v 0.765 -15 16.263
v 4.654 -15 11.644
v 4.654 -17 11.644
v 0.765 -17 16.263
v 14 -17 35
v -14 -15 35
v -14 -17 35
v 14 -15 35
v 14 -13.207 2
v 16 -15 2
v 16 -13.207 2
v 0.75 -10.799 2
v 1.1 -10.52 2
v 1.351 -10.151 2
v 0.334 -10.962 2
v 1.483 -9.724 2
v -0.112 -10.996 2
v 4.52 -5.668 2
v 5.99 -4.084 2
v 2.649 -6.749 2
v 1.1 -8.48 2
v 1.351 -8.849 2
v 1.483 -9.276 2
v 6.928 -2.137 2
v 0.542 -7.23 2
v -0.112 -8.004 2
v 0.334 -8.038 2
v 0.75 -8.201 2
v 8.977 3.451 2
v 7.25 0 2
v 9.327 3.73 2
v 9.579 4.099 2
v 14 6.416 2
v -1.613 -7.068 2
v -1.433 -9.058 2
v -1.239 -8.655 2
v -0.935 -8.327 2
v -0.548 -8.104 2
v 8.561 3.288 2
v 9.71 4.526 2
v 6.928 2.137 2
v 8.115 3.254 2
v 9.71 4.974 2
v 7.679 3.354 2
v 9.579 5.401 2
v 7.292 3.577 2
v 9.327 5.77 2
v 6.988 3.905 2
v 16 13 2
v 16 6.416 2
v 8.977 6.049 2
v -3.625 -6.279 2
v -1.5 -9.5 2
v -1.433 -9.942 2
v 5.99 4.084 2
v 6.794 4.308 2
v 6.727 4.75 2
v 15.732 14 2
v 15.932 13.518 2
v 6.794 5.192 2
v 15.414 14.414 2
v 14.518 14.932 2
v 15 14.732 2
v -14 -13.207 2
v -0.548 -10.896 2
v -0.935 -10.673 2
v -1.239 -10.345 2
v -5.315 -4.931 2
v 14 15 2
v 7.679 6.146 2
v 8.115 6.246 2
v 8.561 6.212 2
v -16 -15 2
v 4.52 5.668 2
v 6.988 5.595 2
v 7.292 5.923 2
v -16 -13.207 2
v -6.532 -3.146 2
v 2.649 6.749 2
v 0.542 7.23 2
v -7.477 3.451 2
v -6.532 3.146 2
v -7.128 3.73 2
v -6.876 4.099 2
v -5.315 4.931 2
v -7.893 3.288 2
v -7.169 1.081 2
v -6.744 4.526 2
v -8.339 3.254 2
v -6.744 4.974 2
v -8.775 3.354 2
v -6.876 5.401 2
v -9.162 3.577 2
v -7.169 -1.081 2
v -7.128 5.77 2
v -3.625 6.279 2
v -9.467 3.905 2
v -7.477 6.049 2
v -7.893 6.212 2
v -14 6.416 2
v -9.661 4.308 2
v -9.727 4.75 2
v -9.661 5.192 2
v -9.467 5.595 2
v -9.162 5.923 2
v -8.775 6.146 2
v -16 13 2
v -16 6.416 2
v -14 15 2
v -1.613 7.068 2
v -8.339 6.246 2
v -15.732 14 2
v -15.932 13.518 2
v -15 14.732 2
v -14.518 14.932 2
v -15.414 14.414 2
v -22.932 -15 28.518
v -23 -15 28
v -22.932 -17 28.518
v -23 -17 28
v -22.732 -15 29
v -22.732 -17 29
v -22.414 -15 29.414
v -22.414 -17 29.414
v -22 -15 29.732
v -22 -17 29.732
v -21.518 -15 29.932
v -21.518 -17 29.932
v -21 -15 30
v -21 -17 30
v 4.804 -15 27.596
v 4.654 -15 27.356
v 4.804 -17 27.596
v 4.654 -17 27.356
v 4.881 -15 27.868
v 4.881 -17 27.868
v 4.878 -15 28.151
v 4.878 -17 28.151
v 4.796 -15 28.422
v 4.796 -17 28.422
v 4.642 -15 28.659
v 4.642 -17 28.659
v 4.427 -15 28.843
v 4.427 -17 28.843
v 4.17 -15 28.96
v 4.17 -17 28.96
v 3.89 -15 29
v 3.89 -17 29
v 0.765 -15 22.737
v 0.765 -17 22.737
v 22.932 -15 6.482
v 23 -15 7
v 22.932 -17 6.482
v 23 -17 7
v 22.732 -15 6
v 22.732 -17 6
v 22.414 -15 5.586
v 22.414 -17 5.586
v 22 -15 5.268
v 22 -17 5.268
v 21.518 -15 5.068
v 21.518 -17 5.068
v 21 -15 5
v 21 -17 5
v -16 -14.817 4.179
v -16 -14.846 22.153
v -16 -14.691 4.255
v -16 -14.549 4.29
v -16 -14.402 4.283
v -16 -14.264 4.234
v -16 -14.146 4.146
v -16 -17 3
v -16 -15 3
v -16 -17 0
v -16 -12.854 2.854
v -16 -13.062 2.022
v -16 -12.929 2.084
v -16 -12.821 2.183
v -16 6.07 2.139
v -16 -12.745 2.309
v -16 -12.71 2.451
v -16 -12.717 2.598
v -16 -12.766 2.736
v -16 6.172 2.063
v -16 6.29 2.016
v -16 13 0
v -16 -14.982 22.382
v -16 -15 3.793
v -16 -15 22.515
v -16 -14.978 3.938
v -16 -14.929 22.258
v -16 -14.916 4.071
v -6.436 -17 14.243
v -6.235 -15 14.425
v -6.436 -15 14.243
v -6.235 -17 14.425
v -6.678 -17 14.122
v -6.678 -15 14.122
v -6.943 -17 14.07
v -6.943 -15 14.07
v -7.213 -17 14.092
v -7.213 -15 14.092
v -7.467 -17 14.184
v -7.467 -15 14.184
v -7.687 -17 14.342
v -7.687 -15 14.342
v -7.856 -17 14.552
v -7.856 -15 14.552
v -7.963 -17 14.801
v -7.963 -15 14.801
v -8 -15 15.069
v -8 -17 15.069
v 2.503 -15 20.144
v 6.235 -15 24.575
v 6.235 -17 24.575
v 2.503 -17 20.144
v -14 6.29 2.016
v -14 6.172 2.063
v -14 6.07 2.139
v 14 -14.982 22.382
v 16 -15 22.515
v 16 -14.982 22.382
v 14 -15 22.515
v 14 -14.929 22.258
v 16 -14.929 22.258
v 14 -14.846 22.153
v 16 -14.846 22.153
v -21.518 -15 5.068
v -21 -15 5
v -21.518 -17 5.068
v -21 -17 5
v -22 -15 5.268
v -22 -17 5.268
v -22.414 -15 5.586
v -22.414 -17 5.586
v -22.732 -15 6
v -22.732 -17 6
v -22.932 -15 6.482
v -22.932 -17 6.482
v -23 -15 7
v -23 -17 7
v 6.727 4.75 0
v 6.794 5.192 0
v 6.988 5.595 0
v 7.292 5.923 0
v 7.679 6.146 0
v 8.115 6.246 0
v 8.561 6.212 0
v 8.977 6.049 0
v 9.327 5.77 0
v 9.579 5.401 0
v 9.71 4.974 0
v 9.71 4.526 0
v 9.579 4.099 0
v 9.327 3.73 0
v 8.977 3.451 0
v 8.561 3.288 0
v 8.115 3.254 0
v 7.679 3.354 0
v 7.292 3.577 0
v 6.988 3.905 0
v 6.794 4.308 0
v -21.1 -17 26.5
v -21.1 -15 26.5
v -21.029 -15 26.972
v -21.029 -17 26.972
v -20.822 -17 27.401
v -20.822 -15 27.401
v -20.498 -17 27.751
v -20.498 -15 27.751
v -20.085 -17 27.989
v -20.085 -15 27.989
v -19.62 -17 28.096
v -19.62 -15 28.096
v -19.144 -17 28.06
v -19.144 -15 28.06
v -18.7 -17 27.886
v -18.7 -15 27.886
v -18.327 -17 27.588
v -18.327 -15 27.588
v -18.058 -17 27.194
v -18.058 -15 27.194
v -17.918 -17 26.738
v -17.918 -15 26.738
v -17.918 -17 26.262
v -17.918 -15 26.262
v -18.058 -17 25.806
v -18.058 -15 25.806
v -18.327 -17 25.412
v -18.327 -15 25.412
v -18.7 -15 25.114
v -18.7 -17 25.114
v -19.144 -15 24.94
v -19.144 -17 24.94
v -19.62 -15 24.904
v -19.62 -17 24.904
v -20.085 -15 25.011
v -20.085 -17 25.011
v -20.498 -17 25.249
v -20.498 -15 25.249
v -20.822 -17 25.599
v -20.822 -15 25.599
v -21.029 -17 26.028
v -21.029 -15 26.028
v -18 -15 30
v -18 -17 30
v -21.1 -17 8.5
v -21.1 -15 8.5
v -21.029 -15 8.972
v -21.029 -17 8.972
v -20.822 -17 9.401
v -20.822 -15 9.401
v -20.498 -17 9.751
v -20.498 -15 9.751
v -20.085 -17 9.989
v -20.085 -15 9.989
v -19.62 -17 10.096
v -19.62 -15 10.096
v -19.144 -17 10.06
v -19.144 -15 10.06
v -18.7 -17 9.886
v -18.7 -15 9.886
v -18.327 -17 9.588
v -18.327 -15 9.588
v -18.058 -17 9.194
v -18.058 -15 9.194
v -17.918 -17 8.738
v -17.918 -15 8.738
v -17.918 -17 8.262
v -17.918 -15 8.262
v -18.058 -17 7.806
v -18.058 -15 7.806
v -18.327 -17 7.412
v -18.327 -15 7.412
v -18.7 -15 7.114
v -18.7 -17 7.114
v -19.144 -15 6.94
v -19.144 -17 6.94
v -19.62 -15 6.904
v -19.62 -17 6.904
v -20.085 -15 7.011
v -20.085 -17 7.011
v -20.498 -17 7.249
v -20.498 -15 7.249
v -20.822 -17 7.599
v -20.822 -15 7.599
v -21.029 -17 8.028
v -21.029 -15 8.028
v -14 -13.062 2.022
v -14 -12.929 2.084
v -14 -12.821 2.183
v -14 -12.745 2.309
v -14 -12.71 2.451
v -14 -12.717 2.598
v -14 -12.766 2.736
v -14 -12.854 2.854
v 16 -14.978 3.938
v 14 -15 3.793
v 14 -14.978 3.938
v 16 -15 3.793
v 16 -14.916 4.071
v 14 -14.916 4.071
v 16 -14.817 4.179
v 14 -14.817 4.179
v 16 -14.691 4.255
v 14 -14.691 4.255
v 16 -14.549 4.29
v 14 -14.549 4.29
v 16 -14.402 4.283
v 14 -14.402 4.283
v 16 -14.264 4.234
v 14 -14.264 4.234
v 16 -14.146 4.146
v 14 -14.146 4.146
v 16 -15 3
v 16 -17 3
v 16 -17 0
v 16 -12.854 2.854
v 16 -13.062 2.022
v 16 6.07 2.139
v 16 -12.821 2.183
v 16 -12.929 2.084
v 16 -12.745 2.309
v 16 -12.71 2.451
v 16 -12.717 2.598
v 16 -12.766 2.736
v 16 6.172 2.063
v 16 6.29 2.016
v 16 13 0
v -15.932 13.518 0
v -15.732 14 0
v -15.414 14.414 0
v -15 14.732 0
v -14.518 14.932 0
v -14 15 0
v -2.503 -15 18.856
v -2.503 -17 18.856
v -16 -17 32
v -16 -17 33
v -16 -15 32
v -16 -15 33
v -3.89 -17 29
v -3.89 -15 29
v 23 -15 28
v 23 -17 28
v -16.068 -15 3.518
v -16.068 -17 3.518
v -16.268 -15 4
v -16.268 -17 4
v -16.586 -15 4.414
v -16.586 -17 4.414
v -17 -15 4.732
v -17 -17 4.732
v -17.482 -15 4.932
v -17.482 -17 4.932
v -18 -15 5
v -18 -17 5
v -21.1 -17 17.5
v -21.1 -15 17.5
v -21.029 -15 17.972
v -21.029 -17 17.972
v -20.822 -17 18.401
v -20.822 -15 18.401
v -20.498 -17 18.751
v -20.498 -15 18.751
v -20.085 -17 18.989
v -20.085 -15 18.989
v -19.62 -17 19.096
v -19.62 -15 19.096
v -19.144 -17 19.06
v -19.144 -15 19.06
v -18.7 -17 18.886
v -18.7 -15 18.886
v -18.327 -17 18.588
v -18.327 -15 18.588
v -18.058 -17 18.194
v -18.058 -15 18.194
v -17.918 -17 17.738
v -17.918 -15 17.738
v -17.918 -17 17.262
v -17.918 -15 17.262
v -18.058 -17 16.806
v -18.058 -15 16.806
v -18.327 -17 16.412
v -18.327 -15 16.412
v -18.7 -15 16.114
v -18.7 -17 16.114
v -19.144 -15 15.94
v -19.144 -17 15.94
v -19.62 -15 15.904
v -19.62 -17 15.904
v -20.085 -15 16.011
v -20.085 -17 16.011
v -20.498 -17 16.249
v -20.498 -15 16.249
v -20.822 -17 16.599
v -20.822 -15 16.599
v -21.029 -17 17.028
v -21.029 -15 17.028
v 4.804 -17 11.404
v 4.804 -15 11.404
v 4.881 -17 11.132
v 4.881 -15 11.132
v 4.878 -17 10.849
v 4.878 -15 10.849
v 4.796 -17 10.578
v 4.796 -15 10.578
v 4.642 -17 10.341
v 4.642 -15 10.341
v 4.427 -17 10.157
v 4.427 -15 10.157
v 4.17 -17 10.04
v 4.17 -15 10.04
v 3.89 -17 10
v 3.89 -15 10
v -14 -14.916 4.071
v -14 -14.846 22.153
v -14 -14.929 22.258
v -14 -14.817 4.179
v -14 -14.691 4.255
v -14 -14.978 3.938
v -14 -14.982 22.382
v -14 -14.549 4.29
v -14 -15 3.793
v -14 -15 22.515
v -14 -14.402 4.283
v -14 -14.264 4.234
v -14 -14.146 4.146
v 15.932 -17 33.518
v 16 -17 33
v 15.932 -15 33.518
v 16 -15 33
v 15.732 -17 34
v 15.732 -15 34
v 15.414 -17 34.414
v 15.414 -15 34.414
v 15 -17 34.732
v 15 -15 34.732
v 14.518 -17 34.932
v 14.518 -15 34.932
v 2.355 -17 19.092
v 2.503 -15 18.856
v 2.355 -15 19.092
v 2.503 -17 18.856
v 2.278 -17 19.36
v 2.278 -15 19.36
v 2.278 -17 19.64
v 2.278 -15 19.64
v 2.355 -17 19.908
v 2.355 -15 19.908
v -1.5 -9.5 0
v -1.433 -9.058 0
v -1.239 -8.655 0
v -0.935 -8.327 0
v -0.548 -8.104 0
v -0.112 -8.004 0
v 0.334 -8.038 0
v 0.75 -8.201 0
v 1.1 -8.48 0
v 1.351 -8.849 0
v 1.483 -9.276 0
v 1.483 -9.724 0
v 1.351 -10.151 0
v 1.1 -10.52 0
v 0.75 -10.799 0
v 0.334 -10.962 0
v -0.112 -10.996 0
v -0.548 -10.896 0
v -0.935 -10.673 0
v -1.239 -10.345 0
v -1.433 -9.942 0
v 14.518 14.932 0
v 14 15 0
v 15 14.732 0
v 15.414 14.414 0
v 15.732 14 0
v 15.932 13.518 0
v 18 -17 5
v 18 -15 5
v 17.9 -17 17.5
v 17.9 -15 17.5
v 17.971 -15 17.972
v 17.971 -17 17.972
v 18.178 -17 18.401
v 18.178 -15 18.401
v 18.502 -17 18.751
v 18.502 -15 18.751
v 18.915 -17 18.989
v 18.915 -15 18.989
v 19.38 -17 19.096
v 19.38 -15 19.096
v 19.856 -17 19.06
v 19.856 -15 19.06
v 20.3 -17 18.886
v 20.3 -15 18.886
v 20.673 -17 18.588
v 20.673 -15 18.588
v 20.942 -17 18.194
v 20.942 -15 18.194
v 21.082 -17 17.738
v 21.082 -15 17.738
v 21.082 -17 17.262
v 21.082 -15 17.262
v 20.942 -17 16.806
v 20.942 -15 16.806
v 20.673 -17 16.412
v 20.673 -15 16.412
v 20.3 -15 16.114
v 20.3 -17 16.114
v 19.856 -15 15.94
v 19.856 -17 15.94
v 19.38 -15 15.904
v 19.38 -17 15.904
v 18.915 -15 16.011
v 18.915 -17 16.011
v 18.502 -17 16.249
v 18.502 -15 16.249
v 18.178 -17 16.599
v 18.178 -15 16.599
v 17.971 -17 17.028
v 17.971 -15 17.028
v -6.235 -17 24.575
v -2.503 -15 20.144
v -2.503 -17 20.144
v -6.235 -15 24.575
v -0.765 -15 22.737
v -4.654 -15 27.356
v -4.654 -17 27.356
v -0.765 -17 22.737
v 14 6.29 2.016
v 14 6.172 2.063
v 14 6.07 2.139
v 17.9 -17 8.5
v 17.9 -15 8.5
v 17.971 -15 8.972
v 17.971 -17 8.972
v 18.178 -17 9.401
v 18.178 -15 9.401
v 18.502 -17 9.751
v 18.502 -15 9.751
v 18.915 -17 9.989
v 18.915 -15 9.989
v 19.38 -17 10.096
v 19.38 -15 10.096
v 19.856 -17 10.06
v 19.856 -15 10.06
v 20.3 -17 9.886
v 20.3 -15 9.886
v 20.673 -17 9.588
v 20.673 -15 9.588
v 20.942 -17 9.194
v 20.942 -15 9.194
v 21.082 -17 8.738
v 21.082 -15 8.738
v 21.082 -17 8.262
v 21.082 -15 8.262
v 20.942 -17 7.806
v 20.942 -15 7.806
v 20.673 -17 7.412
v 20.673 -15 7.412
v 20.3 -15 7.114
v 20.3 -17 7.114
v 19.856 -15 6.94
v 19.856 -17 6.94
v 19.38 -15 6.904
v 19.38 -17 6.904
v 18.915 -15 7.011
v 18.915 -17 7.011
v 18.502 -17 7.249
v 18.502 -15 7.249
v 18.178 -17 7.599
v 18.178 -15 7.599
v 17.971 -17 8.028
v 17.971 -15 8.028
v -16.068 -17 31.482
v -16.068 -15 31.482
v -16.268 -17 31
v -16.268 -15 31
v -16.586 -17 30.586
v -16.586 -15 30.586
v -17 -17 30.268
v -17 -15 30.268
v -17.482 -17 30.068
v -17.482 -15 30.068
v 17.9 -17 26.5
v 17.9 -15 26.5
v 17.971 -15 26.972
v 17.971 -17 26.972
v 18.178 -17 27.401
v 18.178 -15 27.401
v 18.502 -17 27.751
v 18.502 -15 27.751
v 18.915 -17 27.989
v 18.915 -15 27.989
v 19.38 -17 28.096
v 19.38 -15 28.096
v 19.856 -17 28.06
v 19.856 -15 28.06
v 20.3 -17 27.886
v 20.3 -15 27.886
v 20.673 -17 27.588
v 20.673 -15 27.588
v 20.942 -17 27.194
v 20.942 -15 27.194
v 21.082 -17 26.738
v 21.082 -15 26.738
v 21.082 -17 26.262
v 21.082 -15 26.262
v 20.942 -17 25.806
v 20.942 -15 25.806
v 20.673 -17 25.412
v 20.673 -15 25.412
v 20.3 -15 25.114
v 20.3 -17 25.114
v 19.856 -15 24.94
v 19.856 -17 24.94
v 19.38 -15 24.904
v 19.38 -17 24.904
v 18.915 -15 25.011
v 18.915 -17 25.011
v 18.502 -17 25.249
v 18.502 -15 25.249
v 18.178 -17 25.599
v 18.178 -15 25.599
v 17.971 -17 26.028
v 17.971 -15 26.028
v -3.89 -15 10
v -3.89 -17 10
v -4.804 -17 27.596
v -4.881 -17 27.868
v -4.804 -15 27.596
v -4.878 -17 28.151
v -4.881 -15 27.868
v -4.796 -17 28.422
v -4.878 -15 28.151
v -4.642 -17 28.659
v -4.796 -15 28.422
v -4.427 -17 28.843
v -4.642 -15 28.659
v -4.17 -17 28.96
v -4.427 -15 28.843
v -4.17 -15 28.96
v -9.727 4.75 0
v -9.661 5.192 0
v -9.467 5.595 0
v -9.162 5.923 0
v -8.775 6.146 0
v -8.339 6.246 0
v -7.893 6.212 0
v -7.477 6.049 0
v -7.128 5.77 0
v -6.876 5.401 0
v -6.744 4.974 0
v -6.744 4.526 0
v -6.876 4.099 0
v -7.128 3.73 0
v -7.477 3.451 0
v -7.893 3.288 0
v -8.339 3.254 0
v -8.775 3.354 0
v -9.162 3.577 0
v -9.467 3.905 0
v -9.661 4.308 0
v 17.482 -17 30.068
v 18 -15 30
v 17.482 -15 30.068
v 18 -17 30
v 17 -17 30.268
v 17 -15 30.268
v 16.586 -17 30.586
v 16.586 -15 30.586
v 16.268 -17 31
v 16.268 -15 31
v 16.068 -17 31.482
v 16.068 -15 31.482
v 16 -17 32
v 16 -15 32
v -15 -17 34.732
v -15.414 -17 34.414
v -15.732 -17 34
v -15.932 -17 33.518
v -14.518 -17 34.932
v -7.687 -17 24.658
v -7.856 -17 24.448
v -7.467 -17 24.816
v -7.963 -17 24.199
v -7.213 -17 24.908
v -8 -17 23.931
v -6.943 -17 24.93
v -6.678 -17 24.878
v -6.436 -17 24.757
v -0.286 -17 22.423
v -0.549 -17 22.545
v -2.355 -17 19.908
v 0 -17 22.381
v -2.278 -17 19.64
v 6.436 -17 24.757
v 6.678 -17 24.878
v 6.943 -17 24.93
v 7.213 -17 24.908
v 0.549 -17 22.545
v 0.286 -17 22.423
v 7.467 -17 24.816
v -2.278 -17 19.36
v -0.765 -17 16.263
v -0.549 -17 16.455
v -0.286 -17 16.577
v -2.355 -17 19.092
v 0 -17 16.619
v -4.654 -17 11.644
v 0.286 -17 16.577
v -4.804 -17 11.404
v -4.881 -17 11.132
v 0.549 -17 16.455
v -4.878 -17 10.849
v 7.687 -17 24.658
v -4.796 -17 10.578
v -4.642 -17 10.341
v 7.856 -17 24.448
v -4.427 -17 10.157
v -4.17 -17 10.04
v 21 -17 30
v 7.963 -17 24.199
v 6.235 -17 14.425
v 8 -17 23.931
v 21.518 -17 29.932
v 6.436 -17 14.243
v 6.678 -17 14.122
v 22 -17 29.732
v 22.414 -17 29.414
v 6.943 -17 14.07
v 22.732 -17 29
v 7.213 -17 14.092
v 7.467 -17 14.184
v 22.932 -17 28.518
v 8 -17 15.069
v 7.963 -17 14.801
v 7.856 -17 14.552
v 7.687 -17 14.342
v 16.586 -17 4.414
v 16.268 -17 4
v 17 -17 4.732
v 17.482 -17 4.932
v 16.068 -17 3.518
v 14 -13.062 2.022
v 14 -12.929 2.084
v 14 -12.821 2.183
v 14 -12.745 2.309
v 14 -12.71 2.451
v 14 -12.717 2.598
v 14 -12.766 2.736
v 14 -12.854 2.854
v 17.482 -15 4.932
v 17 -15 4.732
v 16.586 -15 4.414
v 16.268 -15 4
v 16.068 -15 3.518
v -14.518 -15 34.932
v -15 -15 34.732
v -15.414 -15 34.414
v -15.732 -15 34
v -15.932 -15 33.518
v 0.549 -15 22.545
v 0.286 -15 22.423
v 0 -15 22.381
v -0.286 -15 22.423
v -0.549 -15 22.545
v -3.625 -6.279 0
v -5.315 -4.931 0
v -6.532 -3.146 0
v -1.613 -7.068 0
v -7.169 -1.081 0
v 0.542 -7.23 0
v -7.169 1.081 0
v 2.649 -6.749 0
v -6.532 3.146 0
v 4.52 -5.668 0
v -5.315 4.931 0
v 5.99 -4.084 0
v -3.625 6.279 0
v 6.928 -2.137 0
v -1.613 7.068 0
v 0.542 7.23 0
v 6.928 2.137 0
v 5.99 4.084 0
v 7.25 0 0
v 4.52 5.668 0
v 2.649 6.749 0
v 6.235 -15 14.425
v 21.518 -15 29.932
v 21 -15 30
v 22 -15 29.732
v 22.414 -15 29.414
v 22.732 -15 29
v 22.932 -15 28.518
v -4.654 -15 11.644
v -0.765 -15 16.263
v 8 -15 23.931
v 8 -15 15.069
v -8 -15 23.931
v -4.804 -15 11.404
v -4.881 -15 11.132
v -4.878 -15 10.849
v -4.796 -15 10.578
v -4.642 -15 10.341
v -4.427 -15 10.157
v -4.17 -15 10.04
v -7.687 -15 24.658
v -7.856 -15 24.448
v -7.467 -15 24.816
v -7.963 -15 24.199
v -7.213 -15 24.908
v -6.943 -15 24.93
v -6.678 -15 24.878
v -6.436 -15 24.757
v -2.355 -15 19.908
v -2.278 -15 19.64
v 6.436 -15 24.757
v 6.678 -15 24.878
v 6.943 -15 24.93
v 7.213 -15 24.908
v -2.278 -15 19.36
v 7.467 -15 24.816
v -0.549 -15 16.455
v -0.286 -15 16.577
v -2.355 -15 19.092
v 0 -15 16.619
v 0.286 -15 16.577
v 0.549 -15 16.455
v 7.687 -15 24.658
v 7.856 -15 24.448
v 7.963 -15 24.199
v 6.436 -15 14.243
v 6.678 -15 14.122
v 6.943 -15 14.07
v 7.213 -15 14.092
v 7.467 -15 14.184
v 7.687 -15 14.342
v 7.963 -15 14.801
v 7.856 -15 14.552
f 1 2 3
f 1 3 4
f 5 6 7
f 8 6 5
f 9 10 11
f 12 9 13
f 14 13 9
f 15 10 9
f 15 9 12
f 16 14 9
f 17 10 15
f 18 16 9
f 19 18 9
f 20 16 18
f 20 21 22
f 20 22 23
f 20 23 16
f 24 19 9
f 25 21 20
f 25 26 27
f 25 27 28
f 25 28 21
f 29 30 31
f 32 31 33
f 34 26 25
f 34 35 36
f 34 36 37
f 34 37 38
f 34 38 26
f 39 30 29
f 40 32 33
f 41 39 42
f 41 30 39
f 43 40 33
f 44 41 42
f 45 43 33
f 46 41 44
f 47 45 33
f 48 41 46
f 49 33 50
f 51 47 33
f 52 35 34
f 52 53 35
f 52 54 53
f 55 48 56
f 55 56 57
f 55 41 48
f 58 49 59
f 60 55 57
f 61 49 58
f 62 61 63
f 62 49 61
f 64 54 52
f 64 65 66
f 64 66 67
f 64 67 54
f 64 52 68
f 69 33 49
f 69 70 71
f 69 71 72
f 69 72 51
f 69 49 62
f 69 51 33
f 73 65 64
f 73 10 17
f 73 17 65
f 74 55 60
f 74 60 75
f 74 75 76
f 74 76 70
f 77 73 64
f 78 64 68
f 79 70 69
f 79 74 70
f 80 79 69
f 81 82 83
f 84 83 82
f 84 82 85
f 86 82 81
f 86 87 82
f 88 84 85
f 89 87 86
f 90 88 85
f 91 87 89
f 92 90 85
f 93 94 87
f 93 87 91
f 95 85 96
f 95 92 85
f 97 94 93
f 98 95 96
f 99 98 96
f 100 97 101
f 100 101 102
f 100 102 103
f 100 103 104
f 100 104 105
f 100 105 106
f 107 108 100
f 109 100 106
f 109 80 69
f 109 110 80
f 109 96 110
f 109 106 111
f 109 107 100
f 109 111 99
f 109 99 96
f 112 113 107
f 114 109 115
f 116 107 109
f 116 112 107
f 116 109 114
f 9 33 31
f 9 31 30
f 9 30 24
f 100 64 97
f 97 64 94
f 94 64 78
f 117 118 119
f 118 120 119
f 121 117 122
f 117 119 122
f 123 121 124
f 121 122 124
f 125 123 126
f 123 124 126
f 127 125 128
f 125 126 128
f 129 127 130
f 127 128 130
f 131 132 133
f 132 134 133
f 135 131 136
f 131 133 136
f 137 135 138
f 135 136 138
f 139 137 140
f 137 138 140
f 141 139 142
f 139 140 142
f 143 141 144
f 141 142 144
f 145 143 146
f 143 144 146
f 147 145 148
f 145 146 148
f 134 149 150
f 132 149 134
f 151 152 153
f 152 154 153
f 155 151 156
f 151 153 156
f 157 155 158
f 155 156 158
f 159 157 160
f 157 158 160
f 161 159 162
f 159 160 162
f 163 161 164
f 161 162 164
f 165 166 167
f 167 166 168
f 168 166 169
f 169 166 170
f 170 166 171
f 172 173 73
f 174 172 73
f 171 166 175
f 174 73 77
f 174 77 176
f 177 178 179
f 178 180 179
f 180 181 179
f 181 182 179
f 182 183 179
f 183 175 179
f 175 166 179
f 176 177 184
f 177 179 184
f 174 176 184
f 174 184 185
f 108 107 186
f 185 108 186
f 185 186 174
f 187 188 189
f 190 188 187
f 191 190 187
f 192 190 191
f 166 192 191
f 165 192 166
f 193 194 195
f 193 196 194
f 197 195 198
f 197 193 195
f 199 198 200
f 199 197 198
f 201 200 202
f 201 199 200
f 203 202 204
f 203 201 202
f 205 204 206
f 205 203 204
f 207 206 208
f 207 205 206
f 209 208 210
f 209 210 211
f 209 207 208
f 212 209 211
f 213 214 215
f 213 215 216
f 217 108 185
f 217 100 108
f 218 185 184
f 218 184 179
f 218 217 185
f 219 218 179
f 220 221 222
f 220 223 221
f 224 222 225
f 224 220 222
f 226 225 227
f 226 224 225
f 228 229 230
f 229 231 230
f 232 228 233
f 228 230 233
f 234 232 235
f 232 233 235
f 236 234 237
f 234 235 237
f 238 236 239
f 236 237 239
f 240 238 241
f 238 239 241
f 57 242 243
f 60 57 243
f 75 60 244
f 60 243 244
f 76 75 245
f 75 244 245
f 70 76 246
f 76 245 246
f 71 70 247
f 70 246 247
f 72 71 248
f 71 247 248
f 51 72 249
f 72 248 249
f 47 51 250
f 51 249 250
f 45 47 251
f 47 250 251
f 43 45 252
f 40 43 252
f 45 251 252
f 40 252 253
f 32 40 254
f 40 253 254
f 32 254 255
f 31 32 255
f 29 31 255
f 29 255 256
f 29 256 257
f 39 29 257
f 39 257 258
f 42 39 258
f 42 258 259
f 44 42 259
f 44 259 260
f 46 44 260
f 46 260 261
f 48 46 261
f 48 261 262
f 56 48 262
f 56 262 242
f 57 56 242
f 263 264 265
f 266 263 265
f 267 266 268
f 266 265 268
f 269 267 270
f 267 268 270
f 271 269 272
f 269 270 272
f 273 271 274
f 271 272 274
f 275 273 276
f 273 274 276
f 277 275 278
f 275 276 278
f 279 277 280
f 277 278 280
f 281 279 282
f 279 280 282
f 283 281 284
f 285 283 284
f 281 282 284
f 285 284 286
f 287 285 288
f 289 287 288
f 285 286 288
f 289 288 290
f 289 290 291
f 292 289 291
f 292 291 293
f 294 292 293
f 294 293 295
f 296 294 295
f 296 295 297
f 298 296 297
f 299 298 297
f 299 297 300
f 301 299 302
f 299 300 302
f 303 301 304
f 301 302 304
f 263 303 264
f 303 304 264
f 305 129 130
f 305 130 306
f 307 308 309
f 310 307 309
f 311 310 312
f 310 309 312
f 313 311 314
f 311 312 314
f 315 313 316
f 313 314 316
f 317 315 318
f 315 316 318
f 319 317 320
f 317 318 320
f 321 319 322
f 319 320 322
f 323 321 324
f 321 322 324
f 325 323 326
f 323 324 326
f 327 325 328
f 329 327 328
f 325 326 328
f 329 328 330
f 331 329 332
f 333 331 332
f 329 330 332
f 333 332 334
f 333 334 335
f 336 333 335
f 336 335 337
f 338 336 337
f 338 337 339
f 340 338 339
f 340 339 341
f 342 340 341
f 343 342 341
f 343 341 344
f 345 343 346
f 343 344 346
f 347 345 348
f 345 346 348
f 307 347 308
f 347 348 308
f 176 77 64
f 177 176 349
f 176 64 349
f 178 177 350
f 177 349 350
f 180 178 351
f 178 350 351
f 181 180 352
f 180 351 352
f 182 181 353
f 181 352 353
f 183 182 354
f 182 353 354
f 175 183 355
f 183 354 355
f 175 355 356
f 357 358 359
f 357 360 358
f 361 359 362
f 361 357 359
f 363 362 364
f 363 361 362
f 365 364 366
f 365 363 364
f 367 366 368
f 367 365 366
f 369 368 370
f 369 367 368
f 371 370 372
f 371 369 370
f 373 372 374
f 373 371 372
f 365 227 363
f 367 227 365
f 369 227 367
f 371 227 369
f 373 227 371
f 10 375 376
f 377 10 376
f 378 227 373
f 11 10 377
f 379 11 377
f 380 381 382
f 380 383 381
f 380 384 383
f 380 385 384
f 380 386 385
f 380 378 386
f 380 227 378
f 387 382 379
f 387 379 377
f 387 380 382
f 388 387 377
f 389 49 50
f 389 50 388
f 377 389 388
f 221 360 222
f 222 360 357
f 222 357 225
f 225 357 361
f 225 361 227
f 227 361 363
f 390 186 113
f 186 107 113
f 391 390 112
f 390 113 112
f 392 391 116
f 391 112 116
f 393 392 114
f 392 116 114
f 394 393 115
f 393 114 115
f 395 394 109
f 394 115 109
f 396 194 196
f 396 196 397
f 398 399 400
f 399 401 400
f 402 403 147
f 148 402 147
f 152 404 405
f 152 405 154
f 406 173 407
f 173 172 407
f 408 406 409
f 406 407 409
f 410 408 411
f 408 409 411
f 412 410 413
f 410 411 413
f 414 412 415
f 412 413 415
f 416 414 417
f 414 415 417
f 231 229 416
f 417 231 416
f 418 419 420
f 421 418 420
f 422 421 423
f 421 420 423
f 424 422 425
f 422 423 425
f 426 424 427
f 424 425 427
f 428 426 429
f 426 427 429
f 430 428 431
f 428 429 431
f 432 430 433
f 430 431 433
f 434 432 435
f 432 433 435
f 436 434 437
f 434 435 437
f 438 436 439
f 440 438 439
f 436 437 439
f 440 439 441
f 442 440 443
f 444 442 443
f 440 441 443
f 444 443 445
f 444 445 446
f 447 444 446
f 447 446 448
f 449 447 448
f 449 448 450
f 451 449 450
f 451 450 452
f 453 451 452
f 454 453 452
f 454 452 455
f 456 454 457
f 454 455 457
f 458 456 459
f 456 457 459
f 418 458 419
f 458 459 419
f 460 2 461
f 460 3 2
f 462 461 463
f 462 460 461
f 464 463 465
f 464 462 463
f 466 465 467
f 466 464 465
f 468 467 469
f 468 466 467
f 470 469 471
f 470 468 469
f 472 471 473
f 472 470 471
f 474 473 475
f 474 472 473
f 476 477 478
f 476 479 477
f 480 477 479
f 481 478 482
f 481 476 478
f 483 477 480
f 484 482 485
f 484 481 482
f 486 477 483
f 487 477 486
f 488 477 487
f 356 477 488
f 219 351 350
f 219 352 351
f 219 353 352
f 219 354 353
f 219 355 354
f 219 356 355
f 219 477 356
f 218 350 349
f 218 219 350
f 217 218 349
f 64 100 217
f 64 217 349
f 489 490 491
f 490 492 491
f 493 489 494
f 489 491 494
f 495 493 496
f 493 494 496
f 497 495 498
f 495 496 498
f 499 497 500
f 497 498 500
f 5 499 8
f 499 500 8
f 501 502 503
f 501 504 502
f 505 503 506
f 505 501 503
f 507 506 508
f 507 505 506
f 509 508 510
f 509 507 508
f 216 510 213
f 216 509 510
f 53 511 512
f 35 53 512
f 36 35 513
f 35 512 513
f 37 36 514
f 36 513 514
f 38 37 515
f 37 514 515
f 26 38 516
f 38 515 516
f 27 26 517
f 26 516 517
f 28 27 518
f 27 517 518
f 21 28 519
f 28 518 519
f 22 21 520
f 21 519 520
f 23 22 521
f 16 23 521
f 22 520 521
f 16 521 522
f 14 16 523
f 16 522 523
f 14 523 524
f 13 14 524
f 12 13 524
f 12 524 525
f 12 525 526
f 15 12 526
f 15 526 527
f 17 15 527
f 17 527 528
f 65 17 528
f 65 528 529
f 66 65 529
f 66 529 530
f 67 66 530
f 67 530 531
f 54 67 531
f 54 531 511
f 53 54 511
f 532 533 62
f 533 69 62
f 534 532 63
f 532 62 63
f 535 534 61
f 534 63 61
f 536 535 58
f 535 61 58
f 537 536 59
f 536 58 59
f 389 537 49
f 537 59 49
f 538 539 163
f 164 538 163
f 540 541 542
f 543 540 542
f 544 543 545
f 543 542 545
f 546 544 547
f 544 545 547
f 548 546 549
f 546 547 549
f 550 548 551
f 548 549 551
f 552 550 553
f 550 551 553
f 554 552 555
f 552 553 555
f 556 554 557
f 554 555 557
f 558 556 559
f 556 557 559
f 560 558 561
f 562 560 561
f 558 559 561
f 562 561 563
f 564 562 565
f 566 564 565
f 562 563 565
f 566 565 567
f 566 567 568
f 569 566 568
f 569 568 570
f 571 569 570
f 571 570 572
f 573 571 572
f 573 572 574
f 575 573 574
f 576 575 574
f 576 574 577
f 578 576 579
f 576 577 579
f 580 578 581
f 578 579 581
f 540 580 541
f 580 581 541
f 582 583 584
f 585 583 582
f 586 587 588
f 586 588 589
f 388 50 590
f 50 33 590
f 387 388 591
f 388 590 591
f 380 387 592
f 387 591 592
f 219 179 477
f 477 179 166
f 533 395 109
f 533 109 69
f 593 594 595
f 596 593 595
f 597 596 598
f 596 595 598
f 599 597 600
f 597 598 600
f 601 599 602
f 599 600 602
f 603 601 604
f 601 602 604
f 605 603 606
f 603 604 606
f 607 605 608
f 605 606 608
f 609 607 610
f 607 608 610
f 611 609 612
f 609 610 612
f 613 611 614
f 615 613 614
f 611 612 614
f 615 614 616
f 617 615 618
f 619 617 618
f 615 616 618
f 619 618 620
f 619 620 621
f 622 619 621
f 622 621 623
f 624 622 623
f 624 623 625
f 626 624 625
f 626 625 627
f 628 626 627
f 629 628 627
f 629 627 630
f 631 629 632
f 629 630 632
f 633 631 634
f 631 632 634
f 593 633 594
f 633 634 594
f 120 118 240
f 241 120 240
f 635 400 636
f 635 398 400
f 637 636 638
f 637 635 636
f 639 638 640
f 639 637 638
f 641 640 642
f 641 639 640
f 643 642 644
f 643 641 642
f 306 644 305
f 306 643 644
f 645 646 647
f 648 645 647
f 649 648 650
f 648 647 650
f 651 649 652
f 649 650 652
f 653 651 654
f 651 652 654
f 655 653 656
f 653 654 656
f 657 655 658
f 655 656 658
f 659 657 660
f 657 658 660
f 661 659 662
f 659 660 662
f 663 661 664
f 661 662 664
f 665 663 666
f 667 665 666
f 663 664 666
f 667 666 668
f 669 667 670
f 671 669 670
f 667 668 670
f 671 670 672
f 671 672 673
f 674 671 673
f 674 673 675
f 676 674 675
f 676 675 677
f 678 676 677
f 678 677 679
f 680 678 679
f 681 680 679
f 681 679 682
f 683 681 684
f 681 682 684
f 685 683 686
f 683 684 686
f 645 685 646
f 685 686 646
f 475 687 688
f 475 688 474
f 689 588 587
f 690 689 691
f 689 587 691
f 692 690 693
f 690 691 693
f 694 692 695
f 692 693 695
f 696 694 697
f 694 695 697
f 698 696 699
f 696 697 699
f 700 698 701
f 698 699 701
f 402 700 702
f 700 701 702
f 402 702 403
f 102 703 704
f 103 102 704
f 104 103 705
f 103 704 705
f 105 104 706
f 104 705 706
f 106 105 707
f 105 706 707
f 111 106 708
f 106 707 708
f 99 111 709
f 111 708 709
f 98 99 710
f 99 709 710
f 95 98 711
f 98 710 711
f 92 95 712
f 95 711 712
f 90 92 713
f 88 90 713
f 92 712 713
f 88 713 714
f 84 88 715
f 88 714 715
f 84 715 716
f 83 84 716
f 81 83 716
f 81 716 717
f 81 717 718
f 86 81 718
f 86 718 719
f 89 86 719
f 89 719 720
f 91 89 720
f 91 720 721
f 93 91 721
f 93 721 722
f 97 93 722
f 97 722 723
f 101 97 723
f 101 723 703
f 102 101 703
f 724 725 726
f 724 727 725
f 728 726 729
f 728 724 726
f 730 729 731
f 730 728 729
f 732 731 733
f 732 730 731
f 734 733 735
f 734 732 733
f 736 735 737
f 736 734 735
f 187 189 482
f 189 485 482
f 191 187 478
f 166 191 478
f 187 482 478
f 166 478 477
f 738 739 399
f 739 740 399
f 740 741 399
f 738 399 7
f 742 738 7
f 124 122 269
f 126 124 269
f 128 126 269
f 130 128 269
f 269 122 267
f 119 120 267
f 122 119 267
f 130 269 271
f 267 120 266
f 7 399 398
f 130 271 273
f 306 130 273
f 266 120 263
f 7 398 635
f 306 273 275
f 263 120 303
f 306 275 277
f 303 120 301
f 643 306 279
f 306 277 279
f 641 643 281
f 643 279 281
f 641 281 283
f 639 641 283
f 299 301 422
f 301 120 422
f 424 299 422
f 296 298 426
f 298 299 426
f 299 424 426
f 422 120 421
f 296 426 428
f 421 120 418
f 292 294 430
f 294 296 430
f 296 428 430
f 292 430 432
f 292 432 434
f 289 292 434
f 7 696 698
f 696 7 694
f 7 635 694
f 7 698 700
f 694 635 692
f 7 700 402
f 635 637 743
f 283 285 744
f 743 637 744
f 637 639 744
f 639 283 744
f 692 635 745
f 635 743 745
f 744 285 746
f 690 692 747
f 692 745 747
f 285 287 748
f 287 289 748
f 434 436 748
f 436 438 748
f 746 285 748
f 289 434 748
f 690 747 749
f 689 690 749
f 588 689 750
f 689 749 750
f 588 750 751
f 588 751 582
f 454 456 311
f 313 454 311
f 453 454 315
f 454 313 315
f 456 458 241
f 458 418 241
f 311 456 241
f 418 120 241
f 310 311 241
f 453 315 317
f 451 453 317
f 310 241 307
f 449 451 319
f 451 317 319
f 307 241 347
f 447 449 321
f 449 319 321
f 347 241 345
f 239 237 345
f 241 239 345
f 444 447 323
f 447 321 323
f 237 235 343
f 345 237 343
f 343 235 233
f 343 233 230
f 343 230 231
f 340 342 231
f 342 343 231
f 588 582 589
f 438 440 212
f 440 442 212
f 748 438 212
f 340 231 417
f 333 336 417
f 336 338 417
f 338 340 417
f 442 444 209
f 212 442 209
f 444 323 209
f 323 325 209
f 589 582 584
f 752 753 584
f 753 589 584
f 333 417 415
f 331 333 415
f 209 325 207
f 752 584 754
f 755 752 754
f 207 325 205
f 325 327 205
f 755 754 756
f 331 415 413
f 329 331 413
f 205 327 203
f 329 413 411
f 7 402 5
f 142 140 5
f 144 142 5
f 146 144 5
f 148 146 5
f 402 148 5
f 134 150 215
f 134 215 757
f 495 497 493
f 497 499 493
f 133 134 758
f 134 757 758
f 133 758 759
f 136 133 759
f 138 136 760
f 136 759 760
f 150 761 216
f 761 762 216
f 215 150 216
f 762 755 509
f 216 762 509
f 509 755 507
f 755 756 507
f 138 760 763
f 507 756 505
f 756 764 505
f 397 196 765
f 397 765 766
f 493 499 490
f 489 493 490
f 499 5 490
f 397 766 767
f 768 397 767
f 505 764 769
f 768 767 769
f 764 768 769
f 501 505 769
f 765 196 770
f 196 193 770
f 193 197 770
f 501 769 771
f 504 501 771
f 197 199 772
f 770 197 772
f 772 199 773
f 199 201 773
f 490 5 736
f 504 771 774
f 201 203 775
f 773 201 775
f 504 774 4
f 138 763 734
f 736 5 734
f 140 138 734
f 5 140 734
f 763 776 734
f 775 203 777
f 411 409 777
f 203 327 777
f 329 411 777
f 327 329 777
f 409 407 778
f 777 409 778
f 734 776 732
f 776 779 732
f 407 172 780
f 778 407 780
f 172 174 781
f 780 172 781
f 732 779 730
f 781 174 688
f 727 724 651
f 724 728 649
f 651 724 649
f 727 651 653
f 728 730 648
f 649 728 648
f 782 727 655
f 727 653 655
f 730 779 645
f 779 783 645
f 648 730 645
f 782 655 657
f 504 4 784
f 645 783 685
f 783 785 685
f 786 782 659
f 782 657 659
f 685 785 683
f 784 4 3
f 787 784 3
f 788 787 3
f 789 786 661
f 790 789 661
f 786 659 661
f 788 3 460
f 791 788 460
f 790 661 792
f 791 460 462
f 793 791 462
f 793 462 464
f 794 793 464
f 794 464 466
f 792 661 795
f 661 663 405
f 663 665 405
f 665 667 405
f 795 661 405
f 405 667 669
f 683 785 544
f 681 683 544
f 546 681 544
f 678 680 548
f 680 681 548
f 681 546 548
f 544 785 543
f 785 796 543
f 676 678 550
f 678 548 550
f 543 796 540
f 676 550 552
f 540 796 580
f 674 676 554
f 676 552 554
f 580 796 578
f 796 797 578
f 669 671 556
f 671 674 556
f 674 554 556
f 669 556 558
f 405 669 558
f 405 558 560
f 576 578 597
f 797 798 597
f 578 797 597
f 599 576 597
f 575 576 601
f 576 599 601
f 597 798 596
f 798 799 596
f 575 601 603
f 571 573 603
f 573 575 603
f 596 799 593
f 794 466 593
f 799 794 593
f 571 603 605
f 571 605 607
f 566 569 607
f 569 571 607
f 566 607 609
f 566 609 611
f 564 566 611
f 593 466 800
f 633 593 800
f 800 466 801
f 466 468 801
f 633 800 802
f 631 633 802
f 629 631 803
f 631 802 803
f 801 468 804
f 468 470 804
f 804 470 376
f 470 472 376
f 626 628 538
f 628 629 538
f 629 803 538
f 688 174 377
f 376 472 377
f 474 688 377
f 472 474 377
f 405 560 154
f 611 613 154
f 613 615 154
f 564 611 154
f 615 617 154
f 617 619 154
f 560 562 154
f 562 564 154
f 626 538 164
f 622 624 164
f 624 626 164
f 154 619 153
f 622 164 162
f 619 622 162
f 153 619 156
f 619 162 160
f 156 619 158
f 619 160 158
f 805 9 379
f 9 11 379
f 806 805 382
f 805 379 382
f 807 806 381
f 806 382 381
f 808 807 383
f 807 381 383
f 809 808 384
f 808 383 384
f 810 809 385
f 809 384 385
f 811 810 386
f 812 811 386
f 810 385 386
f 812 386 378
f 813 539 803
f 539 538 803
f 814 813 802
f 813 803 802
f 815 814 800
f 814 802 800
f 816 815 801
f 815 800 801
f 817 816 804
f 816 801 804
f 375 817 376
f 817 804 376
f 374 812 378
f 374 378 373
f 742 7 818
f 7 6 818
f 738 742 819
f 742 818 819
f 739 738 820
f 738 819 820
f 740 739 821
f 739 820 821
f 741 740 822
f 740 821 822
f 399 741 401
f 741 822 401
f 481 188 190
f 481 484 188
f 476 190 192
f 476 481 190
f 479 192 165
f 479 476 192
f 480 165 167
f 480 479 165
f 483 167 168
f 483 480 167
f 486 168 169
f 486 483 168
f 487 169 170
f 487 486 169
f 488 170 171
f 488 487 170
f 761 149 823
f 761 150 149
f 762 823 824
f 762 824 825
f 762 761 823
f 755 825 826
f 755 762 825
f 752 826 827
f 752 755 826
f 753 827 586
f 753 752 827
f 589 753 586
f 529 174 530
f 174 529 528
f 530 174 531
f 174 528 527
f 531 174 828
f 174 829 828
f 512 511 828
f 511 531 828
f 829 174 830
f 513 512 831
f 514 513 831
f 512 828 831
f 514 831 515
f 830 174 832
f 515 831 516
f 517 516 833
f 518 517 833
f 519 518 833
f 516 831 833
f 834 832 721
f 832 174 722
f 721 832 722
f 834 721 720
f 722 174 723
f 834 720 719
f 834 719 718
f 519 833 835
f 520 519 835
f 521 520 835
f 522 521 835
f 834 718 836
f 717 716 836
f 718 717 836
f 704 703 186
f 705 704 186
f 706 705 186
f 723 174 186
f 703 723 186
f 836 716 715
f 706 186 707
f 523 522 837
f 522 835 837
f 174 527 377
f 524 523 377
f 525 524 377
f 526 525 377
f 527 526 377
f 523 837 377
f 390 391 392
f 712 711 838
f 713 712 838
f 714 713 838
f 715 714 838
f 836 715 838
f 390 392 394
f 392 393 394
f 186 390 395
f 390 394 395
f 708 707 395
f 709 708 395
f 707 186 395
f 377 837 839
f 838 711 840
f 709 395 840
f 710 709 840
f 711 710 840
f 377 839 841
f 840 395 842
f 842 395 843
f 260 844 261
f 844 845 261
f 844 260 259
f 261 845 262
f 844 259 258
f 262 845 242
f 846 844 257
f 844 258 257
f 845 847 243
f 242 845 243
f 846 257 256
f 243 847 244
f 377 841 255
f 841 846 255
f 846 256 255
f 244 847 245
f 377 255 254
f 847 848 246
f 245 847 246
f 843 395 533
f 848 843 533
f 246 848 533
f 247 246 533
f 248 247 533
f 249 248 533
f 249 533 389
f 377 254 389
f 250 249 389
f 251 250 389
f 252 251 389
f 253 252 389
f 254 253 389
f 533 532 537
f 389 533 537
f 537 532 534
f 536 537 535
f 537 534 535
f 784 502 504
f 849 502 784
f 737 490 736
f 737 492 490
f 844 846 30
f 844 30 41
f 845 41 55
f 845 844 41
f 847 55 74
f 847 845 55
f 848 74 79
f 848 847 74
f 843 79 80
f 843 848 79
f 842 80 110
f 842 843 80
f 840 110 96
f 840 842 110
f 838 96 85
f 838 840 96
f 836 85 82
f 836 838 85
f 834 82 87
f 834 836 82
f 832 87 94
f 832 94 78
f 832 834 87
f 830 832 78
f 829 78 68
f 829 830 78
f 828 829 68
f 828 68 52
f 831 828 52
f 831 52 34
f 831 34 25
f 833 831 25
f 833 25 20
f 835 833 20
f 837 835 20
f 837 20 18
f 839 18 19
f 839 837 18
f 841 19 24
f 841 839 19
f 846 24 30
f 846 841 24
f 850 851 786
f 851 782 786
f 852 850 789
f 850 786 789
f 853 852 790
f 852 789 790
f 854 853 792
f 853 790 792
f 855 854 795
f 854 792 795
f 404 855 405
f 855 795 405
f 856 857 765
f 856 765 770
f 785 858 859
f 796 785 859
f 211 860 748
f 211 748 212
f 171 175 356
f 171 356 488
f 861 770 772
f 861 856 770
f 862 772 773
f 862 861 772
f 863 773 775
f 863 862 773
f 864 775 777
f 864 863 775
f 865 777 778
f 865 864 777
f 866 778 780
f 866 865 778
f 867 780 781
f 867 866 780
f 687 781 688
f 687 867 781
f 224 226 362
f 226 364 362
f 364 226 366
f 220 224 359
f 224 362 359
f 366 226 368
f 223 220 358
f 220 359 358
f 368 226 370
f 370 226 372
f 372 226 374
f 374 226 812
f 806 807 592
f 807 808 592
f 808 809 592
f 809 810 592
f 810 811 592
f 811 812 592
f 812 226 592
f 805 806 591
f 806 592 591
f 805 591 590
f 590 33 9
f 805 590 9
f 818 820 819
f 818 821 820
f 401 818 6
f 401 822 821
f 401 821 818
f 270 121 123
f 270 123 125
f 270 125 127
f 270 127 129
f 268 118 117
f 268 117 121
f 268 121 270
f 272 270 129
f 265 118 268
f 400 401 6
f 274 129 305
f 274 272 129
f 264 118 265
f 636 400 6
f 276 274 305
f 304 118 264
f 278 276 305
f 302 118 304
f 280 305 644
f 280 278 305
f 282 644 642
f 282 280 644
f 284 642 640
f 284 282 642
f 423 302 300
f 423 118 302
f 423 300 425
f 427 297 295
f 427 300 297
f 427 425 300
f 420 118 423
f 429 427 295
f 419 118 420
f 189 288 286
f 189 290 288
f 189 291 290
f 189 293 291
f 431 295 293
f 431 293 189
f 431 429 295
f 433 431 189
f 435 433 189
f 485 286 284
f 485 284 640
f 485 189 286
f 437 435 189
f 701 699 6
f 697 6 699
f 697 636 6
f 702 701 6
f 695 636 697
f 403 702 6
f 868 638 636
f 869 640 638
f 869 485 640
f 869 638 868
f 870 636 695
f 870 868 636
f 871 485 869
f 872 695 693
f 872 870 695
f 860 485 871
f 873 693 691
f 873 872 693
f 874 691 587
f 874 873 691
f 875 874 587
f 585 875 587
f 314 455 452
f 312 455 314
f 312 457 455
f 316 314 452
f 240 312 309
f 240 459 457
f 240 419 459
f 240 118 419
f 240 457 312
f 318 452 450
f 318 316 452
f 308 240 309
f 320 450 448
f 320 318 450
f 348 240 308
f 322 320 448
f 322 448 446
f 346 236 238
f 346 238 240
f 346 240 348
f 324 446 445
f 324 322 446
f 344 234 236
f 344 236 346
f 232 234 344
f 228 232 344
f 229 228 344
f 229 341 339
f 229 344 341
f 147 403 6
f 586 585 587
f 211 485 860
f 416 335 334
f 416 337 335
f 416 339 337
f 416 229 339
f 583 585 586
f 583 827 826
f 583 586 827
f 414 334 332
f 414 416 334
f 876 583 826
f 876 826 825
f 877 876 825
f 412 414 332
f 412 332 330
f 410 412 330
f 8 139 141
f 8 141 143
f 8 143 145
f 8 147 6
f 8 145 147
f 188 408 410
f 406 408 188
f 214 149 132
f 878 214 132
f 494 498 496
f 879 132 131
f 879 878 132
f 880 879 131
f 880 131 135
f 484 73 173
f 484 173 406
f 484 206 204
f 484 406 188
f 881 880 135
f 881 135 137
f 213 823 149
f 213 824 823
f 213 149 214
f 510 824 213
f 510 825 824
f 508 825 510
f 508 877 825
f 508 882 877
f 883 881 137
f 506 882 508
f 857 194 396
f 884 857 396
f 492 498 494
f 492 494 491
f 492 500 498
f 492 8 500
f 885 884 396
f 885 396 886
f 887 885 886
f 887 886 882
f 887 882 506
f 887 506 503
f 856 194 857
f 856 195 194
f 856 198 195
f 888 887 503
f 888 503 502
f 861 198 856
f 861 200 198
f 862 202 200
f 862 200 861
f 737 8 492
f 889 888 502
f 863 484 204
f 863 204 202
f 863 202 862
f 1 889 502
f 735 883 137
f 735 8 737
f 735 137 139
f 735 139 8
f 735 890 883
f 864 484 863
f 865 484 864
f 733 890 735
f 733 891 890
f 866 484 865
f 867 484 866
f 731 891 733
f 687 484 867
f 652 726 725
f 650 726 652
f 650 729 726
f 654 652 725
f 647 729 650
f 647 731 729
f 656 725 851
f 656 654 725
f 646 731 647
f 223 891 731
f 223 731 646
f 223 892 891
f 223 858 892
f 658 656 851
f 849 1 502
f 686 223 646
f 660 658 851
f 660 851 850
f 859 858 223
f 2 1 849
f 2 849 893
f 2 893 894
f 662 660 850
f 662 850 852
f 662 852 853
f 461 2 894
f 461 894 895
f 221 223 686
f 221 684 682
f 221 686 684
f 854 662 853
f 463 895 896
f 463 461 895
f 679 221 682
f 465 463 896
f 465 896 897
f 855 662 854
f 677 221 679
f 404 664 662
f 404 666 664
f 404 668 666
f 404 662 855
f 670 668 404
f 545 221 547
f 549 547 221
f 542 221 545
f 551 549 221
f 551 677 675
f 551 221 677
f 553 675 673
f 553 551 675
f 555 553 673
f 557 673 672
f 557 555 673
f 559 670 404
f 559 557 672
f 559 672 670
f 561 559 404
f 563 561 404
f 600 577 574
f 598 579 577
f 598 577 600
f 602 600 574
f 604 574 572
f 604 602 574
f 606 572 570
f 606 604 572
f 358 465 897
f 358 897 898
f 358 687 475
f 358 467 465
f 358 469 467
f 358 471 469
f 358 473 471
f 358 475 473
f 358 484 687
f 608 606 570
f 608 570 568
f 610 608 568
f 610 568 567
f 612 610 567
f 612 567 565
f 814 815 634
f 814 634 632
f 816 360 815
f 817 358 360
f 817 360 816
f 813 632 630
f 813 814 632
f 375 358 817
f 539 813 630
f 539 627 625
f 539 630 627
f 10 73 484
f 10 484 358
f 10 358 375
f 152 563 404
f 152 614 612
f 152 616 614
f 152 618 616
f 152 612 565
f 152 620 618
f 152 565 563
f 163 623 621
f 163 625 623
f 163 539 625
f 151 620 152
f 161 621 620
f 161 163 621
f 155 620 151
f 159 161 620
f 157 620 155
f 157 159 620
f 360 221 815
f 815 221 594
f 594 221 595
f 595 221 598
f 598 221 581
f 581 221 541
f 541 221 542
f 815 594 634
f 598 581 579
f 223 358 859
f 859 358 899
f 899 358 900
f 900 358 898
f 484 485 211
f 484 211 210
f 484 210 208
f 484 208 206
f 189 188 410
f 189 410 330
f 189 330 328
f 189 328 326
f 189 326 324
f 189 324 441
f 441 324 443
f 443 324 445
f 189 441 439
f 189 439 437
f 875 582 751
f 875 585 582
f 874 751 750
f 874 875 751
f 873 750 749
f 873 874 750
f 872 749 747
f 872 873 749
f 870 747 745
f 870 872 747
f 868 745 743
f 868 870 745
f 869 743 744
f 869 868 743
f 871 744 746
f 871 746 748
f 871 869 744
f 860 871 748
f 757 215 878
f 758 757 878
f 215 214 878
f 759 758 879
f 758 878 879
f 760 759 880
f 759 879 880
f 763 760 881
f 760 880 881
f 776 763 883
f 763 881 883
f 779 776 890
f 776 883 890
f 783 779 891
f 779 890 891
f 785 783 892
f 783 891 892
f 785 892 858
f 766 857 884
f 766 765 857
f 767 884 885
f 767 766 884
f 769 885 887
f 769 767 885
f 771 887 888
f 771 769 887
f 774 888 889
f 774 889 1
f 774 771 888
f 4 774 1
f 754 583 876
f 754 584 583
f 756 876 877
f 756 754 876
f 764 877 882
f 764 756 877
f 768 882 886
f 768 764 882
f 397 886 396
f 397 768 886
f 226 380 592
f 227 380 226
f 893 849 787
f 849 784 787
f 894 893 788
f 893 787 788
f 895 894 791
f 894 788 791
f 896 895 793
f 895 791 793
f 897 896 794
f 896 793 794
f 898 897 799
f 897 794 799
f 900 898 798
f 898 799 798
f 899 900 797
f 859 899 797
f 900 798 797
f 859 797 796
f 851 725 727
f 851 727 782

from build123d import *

# Parameters (mm, degrees)
SKETCH2_W           = 32
SKETCH2_H           = 30
SKETCH2_R           = 1.25
SKETCH2_R_2         = 7.25
BOSS_EXTRUDE1_DEPTH = 2
SKETCH2_4_W         = 32
SKETCH2_4_H         = 2
BOSS_EXTRUDE2_DEPTH = 35
BOSS_EXTRUDE3_DEPTH = 2
FILLET1_R           = 2
SKETCH5_W           = 7
SKETCH5_H           = 25
SKETCH5_R           = 1.6
BOSS_EXTRUDE4_DEPTH = 2
FILLET2_R           = 2
SKETCH14_W          = 16
SKETCH14_H          = 19
CUT_EXTRUDE1_DEPTH  = 52.51698749
CUT_EXTRUDE2_DEPTH  = 56.090834083
EXTRUDE_THIN1_DEPTH = 2
FILLET3_R           = 1
FILLET4_R           = 0.5
SKETCH21_R          = 1.5
CUT_EXTRUDE3_DEPTH  = 10


with BuildPart() as part:
    # Sketch2 → Boss-Extrude1 (new body)
    with BuildSketch(Plane.XY):
        Rectangle(SKETCH2_W, SKETCH2_H)
        with Locations((-8.227241336, 4.75)):
            Circle(SKETCH2_R, mode=Mode.SUBTRACT)
        with Locations((8.227241336, 4.75)):
            Circle(SKETCH2_R, mode=Mode.SUBTRACT)
        with Locations((0, -9.5)):
            Circle(SKETCH2_R, mode=Mode.SUBTRACT)
        Circle(SKETCH2_R_2, mode=Mode.SUBTRACT)
    extrude(amount=BOSS_EXTRUDE1_DEPTH)

    # Sketch2<4> → Boss-Extrude2 (add)
    with BuildSketch(Plane.XY):
        with Locations((0, -16)):
            Rectangle(SKETCH2_4_W, SKETCH2_4_H)
    extrude(amount=BOSS_EXTRUDE2_DEPTH)

    # Sketch3 → Boss-Extrude3 (add)
    with BuildSketch(Plane(origin=(16, 0, 0), x_dir=(0, 0, -1), z_dir=(1, 0, 0))):
        Polygon((-2, 6.21520857), (-22.300940927, -15), (-2, -15), align=None)
    boss_extrude3 = extrude(amount=-BOSS_EXTRUDE3_DEPTH)

    # Mirror1: Boss-Extrude3 across plane
    add(boss_extrude3.mirror(Plane.ZY))

    # Fillet1
    fillet1_edges = [part.edges().sort_by_distance(p)[0] for p in [
        (-16, 15, 1),
        (16, 15, 1),
    ]]
    fillet(fillet1_edges, radius=FILLET1_R)

    # Sketch5 → Boss-Extrude4 (add)
    # profile 1 of 2: a face of its own
    with BuildSketch(Plane(origin=(0, -15, 0), x_dir=(1, 0, 0), z_dir=(0, 1, 0))):
        with Locations((19.5, -17.5)):
            Rectangle(SKETCH5_W, SKETCH5_H)
        with Locations(Location((19.5, -26.5, 0), (0, 0, 180))):
            Circle(SKETCH5_R, mode=Mode.SUBTRACT)
        with Locations(Location((19.5, -17.5, 0), (0, 0, 180))):
            Circle(SKETCH5_R, mode=Mode.SUBTRACT)
        with Locations(Location((19.5, -8.5, 0), (0, 0, 180))):
            Circle(SKETCH5_R, mode=Mode.SUBTRACT)
    # profile 2 of 2: a face of its own
    with BuildSketch(Plane(origin=(0, -15, 0), x_dir=(1, 0, 0), z_dir=(0, 1, 0))):
        with Locations((-19.5, -17.5)):
            Rectangle(SKETCH5_W, SKETCH5_H)
        with Locations(Location((-19.5, -26.5, 0), (0, 0, 180))):
            Circle(SKETCH5_R, mode=Mode.SUBTRACT)
        with Locations(Location((-19.5, -17.5, 0), (0, 0, 180))):
            Circle(SKETCH5_R, mode=Mode.SUBTRACT)
        with Locations(Location((-19.5, -8.5, 0), (0, 0, 180))):
            Circle(SKETCH5_R, mode=Mode.SUBTRACT)
    extrude(amount=-BOSS_EXTRUDE4_DEPTH)

    # Fillet2
    fillet2_edges = [part.edges().sort_by_distance(p)[0] for p in [
        (-23, -16, 5),
        (-16, -16, 5),
        (-16, -16, 30),
        (16, -16, 35),
        (-16, -16, 35),
        (23, -16, 30),
        (16, -16, 30),
        (16, -16, 5),
        (23, -16, 5),
        (-23, -16, 30),
    ]]
    fillet(fillet2_edges, radius=FILLET2_R)

    # Sketch14 → Cut-Extrude1 (cut, through all)
    with BuildSketch(Plane(origin=(0, -15, 0), x_dir=(1, 0, 0), z_dir=(0, 1, 0))):
        with Locations((0, -19.5)):
            Rectangle(SKETCH14_W, SKETCH14_H)
    extrude(amount=-CUT_EXTRUDE1_DEPTH, mode=Mode.SUBTRACT)

    # Sketch20 → Cut-Extrude2 (cut, through all)
    with BuildSketch(Plane.ZY.offset(16)):
        Polygon((2, -12), (5, -15), (2, -15), align=None)
    extrude(amount=-CUT_EXTRUDE2_DEPTH, mode=Mode.SUBTRACT)

    # Sketch15 → Extrude-Thin1 (add)
    with BuildSketch(Plane(origin=(0, -15, 0), x_dir=(1, 0, 0), z_dir=(0, 1, 0))):
        Polygon((6.852633203, -9.033796381), (-9.147366797, -28.033796381), (-6.852633203, -29.966203619), (9.147366797, -10.966203619), align=None)
        Polygon((-9.147366797, -10.966203619), (6.852633203, -29.966203619), (9.147366797, -28.033796381), (-6.852633203, -9.033796381), align=None)
    extrude(amount=-EXTRUDE_THIN1_DEPTH)

    # Fillet3
    fillet3_edges = [part.edges().sort_by_distance(p)[0] for p in [
        (-6.03898805, -16, 10),
        (6.03898805, -16, 10),
        (-8, -16, 12.32870169),
        (-8, -16, 26.67129831),
        (6.03898805, -16, 29),
        (-6.03898805, -16, 29),
        (8, -16, 26.67129831),
        (8, -16, 12.32870169),
        (1.96101195, -16, 19.5),
        (0, -16, 21.82870169),
        (-1.96101195, -16, 19.5),
        (0, -16, 17.17129831),
    ]]
    fillet(fillet3_edges, radius=FILLET3_R)

    # Fillet4
    fillet4_edges = [part.edges().sort_by_distance(p)[0] for p in [
        (15, -12, 2),
        (15, -15, 5),
        (-15, -15, 5),
        (-15, -12, 2),
        (15, 6.21520857, 2),
        (15, -15, 22.300940927),
        (-15, 6.21520857, 2),
        (-15, -15, 22.300940927),
    ]]
    fillet(fillet4_edges, radius=FILLET4_R)

    # Sketch21 → Cut-Extrude3 (cut)
    with BuildSketch(Plane(origin=(0, 0, 0), x_dir=(-1, 0, 0), z_dir=(0, 0, -1))):
        with Locations((-8.227241336, 4.75)):
            Circle(SKETCH21_R)
        with Locations((8.227241336, 4.75)):
            Circle(SKETCH21_R)
        with Locations((0, -9.5)):
            Circle(SKETCH21_R)
    extrude(amount=-CUT_EXTRUDE3_DEPTH, mode=Mode.SUBTRACT)


solid = part.part
